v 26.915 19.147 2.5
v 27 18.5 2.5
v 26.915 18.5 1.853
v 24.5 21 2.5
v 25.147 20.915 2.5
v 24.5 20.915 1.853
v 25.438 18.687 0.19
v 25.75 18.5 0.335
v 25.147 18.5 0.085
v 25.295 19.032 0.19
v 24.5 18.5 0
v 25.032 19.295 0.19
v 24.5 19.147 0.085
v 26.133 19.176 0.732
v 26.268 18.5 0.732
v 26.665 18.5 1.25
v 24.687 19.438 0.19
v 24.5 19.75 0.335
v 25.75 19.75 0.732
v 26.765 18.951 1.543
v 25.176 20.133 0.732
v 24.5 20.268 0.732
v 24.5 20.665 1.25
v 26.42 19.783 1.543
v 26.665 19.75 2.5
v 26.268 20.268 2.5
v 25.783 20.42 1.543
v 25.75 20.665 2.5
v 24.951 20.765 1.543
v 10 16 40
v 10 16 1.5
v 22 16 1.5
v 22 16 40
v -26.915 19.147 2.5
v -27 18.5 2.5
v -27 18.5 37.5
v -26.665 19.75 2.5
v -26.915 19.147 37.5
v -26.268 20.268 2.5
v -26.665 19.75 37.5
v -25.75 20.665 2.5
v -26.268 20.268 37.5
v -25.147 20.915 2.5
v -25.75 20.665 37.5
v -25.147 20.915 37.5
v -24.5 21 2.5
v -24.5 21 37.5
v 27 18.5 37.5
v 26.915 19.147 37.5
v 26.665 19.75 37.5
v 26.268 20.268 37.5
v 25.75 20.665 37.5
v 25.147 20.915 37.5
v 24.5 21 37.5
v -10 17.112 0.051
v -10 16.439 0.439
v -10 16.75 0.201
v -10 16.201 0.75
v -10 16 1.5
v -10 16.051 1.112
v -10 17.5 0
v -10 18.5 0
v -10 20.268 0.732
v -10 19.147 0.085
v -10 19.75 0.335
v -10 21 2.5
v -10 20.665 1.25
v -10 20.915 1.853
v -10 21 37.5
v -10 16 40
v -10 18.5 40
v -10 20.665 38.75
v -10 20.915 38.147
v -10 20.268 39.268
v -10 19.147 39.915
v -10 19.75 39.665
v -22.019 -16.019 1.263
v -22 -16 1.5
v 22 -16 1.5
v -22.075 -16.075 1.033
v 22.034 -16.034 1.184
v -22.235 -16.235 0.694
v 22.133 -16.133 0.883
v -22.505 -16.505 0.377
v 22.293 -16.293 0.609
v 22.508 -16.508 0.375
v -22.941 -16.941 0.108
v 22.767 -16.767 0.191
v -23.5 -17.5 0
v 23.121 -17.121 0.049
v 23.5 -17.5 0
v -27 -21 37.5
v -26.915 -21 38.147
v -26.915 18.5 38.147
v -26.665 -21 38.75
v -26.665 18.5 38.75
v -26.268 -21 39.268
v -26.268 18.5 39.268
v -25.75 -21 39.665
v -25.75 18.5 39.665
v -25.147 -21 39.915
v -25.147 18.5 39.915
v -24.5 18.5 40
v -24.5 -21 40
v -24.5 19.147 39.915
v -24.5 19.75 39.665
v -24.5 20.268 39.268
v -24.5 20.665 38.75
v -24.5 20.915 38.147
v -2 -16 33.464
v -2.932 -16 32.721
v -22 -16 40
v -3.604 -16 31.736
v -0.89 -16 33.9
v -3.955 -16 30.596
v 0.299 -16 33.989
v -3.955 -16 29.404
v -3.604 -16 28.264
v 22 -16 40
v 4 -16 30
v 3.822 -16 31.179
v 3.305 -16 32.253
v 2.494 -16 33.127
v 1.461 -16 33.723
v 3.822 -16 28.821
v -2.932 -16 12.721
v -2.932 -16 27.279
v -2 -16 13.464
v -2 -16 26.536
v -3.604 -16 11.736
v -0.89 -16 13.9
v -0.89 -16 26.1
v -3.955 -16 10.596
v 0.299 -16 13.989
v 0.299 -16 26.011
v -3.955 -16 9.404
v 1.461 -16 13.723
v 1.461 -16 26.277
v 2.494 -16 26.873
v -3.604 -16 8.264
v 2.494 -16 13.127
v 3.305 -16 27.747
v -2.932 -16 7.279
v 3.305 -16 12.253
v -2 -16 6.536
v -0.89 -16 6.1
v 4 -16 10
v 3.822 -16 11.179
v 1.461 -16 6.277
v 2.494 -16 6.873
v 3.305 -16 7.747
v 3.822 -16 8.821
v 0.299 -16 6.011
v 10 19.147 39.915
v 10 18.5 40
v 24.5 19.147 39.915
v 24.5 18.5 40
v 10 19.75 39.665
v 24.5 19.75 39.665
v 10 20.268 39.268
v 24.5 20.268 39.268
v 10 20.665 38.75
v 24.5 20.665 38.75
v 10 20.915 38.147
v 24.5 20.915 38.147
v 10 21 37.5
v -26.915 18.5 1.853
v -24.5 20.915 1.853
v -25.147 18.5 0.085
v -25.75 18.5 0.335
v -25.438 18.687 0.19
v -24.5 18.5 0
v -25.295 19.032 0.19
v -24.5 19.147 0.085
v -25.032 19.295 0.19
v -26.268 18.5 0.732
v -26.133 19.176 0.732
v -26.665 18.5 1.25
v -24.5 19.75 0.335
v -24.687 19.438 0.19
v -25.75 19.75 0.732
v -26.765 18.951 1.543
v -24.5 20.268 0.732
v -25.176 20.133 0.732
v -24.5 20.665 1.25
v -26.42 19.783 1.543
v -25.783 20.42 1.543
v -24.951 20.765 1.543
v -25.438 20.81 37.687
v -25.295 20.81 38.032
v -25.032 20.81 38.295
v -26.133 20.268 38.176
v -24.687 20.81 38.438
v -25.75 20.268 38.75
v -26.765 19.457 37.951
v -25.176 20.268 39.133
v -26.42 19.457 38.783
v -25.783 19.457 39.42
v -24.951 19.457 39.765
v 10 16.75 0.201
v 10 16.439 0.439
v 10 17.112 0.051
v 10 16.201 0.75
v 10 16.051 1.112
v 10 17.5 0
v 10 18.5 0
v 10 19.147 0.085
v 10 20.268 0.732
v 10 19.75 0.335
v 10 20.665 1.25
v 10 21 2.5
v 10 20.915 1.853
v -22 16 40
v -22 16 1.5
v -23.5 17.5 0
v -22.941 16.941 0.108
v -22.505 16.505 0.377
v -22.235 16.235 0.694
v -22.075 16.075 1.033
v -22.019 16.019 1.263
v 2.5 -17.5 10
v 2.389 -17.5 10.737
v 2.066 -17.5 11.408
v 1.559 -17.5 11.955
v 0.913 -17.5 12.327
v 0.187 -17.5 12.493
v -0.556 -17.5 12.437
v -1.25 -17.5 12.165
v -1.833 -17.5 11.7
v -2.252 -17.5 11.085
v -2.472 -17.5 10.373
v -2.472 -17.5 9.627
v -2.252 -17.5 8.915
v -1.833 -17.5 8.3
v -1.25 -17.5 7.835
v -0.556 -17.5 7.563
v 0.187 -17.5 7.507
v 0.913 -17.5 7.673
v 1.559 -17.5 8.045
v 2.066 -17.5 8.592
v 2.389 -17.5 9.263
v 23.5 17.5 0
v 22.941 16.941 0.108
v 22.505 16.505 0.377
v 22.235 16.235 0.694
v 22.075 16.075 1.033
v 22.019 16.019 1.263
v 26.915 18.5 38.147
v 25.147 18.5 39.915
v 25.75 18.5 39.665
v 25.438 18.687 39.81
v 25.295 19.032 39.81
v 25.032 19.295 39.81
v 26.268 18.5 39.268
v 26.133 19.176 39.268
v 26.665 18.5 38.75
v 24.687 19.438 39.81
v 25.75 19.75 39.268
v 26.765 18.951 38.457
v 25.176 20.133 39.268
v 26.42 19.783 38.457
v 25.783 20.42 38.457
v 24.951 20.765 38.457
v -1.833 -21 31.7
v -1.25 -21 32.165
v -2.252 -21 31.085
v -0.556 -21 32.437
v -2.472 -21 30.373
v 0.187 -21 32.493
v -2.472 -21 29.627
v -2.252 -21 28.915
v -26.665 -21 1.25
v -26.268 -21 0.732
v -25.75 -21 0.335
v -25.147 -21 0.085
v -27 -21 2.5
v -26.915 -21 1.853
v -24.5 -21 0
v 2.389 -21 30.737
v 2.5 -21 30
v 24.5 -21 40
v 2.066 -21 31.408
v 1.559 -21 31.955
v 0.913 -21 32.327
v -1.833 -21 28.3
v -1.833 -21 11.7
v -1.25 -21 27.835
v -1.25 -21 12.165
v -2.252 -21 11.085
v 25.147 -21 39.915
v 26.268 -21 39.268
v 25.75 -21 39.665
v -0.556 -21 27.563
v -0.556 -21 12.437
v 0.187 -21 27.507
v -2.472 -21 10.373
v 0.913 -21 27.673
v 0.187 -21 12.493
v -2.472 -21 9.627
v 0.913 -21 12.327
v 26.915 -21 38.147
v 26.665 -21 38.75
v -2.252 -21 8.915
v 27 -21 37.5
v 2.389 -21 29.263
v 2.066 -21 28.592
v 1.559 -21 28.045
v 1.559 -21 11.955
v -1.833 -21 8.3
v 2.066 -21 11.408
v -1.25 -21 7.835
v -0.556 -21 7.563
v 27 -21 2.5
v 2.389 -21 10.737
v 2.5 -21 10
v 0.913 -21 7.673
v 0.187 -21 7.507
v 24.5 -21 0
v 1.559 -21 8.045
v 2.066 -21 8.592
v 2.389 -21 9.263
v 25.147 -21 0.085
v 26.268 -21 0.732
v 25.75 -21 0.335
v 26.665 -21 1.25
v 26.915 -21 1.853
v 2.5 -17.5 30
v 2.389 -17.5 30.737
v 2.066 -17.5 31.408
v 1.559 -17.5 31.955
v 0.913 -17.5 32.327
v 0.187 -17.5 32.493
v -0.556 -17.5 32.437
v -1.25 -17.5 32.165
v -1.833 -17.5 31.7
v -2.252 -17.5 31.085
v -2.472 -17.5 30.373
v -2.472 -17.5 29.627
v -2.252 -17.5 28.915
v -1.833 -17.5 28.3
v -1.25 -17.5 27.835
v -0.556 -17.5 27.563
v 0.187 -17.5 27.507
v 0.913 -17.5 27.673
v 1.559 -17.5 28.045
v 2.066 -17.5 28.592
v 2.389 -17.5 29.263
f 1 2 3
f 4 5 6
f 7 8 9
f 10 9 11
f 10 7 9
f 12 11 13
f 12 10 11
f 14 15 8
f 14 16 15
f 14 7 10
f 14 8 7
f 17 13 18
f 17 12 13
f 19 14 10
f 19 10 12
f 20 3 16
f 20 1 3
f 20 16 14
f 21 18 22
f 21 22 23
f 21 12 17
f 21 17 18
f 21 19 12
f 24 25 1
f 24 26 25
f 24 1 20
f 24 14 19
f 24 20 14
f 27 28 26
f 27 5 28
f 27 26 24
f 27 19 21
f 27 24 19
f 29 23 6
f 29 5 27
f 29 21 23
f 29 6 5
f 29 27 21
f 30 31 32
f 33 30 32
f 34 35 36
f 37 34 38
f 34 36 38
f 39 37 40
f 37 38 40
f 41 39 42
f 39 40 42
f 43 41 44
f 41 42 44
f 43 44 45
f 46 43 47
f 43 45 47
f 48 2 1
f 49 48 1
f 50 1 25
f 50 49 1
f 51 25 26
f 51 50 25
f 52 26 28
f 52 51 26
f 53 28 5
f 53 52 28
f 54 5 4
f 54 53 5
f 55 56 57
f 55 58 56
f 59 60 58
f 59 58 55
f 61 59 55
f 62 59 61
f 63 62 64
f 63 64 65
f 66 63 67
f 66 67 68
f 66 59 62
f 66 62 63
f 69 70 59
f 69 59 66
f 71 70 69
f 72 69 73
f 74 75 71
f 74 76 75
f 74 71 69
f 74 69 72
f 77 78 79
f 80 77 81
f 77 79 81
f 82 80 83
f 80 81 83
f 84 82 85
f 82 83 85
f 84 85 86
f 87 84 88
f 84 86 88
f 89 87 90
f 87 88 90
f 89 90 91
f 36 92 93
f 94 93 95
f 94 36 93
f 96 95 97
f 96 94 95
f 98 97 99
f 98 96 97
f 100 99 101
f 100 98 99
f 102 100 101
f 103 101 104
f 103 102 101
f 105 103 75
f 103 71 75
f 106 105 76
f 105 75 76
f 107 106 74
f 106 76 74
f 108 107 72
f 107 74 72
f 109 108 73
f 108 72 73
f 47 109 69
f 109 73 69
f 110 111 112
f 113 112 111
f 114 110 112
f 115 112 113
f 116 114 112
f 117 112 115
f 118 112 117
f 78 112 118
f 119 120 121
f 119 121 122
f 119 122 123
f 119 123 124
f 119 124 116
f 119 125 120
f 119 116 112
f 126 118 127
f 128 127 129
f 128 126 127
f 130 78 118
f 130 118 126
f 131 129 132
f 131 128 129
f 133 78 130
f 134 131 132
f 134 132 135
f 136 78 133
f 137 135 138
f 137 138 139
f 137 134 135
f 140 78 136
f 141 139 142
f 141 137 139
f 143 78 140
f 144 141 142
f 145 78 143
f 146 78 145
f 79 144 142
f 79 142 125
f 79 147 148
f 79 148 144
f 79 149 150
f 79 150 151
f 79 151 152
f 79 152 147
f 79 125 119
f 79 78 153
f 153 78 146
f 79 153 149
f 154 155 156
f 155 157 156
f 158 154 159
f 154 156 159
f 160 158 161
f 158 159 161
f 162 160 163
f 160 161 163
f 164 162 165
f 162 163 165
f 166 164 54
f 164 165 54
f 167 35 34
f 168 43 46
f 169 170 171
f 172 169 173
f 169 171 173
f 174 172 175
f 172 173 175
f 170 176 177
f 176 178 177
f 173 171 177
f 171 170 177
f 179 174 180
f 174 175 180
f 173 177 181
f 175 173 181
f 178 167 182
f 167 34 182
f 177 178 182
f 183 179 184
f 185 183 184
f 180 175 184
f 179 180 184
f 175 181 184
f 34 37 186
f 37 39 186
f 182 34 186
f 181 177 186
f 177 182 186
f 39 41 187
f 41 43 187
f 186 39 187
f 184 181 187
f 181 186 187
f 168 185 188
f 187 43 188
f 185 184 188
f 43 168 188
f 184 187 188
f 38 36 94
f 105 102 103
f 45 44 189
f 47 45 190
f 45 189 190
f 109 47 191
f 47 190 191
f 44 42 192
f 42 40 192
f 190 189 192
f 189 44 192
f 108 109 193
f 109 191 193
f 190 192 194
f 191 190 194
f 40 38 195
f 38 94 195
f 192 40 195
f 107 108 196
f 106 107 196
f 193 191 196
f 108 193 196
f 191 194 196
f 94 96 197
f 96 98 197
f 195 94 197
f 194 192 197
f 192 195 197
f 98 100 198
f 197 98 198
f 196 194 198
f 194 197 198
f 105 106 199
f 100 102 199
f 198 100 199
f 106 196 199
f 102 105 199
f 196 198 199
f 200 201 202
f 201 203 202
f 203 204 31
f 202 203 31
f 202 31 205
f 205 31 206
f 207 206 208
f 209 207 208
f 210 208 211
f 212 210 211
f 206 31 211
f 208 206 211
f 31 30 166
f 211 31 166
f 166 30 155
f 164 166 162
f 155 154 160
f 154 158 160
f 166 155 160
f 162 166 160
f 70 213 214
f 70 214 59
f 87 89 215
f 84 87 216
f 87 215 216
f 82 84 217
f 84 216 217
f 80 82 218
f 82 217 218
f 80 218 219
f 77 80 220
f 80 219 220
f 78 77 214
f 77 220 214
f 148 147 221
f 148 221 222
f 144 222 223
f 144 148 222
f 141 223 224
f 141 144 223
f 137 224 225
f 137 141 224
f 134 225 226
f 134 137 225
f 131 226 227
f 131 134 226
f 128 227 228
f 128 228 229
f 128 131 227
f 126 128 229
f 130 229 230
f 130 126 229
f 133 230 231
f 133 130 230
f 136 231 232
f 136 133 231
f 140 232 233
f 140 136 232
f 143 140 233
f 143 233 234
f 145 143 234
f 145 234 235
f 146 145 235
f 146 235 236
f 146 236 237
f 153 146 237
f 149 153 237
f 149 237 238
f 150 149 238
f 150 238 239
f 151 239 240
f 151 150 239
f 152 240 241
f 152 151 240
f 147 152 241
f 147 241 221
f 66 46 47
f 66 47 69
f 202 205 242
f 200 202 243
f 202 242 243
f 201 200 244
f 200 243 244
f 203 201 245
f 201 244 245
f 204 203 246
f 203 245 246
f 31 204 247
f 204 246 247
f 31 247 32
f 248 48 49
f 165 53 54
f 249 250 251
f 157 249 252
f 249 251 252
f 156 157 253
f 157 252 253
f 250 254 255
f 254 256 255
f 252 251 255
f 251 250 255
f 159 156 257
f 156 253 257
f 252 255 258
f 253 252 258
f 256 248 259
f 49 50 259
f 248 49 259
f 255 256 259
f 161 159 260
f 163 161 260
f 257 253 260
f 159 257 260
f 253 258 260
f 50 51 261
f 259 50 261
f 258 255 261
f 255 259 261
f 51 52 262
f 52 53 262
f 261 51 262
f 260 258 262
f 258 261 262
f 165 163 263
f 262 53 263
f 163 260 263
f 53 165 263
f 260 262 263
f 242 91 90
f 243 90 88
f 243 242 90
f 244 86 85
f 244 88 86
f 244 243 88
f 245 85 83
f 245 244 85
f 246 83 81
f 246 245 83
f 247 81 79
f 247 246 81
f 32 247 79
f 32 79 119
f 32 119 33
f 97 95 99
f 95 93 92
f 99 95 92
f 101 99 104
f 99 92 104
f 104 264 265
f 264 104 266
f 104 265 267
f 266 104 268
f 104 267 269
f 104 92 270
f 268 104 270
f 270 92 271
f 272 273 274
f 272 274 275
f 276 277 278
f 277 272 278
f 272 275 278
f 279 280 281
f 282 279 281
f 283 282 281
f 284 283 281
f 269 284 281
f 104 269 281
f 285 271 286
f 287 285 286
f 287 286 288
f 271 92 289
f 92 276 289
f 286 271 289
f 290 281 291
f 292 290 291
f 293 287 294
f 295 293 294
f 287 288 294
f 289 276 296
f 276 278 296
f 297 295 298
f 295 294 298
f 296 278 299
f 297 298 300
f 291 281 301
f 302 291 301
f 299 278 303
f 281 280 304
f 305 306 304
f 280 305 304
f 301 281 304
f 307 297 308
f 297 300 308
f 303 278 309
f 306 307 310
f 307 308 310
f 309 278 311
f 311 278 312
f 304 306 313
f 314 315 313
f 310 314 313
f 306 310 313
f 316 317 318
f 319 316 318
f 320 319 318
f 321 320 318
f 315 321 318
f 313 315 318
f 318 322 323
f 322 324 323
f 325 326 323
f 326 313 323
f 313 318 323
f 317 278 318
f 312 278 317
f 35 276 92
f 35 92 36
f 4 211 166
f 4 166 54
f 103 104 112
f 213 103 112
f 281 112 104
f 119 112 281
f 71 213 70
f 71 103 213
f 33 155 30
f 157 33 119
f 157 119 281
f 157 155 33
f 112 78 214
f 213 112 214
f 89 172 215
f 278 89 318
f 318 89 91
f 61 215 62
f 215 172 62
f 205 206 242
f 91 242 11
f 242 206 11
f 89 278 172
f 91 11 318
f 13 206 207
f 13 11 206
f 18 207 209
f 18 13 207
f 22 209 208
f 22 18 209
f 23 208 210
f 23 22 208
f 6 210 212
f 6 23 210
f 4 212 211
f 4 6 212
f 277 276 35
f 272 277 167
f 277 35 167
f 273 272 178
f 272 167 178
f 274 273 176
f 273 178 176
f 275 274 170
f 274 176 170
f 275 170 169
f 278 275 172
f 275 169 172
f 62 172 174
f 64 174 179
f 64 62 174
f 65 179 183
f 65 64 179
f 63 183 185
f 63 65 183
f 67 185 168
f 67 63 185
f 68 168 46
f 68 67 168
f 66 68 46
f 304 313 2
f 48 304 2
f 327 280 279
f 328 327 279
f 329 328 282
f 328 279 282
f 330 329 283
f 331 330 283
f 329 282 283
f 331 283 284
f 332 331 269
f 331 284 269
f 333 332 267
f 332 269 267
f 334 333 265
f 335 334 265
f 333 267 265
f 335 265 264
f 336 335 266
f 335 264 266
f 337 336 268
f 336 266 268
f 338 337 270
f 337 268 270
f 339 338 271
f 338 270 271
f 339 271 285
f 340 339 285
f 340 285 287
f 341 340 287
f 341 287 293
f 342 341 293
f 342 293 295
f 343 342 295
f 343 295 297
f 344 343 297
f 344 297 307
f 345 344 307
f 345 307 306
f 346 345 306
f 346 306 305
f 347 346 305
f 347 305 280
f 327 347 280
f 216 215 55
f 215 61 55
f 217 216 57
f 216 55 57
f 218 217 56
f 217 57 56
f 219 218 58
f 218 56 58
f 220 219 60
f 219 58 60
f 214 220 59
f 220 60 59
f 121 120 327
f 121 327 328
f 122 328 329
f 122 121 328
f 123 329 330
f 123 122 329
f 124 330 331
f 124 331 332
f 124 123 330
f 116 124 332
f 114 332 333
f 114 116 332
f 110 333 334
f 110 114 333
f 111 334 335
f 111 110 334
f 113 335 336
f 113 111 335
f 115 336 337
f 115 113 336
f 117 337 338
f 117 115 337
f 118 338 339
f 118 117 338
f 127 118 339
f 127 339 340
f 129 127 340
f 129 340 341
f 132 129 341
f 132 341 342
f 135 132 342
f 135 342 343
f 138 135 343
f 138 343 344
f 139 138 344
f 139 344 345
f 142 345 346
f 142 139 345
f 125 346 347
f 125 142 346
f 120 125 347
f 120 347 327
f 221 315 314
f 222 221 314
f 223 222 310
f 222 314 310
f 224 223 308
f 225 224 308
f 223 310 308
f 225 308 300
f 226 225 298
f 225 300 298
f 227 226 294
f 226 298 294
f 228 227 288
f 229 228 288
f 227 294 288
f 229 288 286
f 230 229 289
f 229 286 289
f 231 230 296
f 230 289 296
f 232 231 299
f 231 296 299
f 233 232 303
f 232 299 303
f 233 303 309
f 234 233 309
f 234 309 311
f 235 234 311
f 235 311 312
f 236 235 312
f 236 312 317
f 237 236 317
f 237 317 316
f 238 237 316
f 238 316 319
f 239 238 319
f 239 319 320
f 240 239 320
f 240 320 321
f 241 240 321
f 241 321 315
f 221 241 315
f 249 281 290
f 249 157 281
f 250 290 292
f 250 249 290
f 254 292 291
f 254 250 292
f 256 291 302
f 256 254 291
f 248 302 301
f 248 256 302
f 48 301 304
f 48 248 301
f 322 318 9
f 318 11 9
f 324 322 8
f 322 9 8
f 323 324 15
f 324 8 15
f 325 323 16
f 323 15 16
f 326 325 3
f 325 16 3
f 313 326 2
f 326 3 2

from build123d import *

# Parameters (mm, degrees)
SKETCH_W        = 54
SKETCH_H        = 42
SKETCH_W_2      = 44
SKETCH_H_2      = 32
PAD_DEPTH       = 40
SKETCH001_W     = 20
SKETCH001_H     = 5
POCKET_DEPTH    = 40
SKETCH002_R     = 2.5
POCKET001_DEPTH = 42.001
CHAMFER_SIZE    = 1.5
FILLET_R        = 2.5
SKETCH003_R     = 2.5
POCKET002_DEPTH = 42.001
CHAMFER001_SIZE = 1.5
FILLET001_R     = 1.5


with BuildPart() as part:
    # Sketch → Pad (new body)
    with BuildSketch(Plane.XY):
        Rectangle(SKETCH_W, SKETCH_H)
        Rectangle(SKETCH_W_2, SKETCH_H_2, mode=Mode.SUBTRACT)
    extrude(amount=PAD_DEPTH)

    # Sketch001 (on Face10 of Pad) → Pocket (cut)
    with BuildSketch(Plane.XY.offset(40)):
        with Locations((0, 18.5)):
            Rectangle(SKETCH001_W, SKETCH001_H)
    extrude(amount=-POCKET_DEPTH, mode=Mode.SUBTRACT)

    # Sketch002 (on Face14 of Pocket) → Pocket001 (cut, through all)
    with BuildSketch(Plane.XZ.offset(21)):
        with Locations((0, 10)):
            Circle(SKETCH002_R)
    extrude(amount=-POCKET001_DEPTH, mode=Mode.SUBTRACT)

    # Chamfer
    chamfer_edges = [part.edges().sort_by_distance(p)[0] for p in [
        (-2.5, -16, 10),
    ]]
    chamfer(chamfer_edges, length=CHAMFER_SIZE)

    # Fillet
    fillet_edges = [part.edges().sort_by_distance(p)[0] for p in [
        (27, 21, 20),
        (27, 0, 40),
        (-27, 0, 40),
        (-27, 21, 20),
        (-27, 0, 0),
        (27, 0, 0),
        (18.5, 21, 40),
        (-18.5, 21, 40),
        (-18.5, 21, 0),
        (18.5, 21, 0),
    ]]
    fillet(fillet_edges, radius=FILLET_R)

    # Sketch003 (on Face7 of Fillet) → Pocket002 (cut, through all)
    with BuildSketch(Plane.XZ.offset(21)):
        with Locations((0, 30)):
            Circle(SKETCH003_R)
    extrude(amount=-POCKET002_DEPTH, mode=Mode.SUBTRACT)

    # Chamfer001
    chamfer001_edges = [part.edges().sort_by_distance(p)[0] for p in [
        (-2.5, -16, 30),
    ]]
    chamfer(chamfer001_edges, length=CHAMFER001_SIZE)

    # Fillet001
    fillet001_edges = [part.edges().sort_by_distance(p)[0] for p in [
        (-22, 0, 0),
        (0, -16, 0),
        (22, 0, 0),
        (16, 16, 0),
        (-16, 16, 0),
    ]]
    fillet(fillet001_edges, radius=FILLET001_R)


solid = part.part
